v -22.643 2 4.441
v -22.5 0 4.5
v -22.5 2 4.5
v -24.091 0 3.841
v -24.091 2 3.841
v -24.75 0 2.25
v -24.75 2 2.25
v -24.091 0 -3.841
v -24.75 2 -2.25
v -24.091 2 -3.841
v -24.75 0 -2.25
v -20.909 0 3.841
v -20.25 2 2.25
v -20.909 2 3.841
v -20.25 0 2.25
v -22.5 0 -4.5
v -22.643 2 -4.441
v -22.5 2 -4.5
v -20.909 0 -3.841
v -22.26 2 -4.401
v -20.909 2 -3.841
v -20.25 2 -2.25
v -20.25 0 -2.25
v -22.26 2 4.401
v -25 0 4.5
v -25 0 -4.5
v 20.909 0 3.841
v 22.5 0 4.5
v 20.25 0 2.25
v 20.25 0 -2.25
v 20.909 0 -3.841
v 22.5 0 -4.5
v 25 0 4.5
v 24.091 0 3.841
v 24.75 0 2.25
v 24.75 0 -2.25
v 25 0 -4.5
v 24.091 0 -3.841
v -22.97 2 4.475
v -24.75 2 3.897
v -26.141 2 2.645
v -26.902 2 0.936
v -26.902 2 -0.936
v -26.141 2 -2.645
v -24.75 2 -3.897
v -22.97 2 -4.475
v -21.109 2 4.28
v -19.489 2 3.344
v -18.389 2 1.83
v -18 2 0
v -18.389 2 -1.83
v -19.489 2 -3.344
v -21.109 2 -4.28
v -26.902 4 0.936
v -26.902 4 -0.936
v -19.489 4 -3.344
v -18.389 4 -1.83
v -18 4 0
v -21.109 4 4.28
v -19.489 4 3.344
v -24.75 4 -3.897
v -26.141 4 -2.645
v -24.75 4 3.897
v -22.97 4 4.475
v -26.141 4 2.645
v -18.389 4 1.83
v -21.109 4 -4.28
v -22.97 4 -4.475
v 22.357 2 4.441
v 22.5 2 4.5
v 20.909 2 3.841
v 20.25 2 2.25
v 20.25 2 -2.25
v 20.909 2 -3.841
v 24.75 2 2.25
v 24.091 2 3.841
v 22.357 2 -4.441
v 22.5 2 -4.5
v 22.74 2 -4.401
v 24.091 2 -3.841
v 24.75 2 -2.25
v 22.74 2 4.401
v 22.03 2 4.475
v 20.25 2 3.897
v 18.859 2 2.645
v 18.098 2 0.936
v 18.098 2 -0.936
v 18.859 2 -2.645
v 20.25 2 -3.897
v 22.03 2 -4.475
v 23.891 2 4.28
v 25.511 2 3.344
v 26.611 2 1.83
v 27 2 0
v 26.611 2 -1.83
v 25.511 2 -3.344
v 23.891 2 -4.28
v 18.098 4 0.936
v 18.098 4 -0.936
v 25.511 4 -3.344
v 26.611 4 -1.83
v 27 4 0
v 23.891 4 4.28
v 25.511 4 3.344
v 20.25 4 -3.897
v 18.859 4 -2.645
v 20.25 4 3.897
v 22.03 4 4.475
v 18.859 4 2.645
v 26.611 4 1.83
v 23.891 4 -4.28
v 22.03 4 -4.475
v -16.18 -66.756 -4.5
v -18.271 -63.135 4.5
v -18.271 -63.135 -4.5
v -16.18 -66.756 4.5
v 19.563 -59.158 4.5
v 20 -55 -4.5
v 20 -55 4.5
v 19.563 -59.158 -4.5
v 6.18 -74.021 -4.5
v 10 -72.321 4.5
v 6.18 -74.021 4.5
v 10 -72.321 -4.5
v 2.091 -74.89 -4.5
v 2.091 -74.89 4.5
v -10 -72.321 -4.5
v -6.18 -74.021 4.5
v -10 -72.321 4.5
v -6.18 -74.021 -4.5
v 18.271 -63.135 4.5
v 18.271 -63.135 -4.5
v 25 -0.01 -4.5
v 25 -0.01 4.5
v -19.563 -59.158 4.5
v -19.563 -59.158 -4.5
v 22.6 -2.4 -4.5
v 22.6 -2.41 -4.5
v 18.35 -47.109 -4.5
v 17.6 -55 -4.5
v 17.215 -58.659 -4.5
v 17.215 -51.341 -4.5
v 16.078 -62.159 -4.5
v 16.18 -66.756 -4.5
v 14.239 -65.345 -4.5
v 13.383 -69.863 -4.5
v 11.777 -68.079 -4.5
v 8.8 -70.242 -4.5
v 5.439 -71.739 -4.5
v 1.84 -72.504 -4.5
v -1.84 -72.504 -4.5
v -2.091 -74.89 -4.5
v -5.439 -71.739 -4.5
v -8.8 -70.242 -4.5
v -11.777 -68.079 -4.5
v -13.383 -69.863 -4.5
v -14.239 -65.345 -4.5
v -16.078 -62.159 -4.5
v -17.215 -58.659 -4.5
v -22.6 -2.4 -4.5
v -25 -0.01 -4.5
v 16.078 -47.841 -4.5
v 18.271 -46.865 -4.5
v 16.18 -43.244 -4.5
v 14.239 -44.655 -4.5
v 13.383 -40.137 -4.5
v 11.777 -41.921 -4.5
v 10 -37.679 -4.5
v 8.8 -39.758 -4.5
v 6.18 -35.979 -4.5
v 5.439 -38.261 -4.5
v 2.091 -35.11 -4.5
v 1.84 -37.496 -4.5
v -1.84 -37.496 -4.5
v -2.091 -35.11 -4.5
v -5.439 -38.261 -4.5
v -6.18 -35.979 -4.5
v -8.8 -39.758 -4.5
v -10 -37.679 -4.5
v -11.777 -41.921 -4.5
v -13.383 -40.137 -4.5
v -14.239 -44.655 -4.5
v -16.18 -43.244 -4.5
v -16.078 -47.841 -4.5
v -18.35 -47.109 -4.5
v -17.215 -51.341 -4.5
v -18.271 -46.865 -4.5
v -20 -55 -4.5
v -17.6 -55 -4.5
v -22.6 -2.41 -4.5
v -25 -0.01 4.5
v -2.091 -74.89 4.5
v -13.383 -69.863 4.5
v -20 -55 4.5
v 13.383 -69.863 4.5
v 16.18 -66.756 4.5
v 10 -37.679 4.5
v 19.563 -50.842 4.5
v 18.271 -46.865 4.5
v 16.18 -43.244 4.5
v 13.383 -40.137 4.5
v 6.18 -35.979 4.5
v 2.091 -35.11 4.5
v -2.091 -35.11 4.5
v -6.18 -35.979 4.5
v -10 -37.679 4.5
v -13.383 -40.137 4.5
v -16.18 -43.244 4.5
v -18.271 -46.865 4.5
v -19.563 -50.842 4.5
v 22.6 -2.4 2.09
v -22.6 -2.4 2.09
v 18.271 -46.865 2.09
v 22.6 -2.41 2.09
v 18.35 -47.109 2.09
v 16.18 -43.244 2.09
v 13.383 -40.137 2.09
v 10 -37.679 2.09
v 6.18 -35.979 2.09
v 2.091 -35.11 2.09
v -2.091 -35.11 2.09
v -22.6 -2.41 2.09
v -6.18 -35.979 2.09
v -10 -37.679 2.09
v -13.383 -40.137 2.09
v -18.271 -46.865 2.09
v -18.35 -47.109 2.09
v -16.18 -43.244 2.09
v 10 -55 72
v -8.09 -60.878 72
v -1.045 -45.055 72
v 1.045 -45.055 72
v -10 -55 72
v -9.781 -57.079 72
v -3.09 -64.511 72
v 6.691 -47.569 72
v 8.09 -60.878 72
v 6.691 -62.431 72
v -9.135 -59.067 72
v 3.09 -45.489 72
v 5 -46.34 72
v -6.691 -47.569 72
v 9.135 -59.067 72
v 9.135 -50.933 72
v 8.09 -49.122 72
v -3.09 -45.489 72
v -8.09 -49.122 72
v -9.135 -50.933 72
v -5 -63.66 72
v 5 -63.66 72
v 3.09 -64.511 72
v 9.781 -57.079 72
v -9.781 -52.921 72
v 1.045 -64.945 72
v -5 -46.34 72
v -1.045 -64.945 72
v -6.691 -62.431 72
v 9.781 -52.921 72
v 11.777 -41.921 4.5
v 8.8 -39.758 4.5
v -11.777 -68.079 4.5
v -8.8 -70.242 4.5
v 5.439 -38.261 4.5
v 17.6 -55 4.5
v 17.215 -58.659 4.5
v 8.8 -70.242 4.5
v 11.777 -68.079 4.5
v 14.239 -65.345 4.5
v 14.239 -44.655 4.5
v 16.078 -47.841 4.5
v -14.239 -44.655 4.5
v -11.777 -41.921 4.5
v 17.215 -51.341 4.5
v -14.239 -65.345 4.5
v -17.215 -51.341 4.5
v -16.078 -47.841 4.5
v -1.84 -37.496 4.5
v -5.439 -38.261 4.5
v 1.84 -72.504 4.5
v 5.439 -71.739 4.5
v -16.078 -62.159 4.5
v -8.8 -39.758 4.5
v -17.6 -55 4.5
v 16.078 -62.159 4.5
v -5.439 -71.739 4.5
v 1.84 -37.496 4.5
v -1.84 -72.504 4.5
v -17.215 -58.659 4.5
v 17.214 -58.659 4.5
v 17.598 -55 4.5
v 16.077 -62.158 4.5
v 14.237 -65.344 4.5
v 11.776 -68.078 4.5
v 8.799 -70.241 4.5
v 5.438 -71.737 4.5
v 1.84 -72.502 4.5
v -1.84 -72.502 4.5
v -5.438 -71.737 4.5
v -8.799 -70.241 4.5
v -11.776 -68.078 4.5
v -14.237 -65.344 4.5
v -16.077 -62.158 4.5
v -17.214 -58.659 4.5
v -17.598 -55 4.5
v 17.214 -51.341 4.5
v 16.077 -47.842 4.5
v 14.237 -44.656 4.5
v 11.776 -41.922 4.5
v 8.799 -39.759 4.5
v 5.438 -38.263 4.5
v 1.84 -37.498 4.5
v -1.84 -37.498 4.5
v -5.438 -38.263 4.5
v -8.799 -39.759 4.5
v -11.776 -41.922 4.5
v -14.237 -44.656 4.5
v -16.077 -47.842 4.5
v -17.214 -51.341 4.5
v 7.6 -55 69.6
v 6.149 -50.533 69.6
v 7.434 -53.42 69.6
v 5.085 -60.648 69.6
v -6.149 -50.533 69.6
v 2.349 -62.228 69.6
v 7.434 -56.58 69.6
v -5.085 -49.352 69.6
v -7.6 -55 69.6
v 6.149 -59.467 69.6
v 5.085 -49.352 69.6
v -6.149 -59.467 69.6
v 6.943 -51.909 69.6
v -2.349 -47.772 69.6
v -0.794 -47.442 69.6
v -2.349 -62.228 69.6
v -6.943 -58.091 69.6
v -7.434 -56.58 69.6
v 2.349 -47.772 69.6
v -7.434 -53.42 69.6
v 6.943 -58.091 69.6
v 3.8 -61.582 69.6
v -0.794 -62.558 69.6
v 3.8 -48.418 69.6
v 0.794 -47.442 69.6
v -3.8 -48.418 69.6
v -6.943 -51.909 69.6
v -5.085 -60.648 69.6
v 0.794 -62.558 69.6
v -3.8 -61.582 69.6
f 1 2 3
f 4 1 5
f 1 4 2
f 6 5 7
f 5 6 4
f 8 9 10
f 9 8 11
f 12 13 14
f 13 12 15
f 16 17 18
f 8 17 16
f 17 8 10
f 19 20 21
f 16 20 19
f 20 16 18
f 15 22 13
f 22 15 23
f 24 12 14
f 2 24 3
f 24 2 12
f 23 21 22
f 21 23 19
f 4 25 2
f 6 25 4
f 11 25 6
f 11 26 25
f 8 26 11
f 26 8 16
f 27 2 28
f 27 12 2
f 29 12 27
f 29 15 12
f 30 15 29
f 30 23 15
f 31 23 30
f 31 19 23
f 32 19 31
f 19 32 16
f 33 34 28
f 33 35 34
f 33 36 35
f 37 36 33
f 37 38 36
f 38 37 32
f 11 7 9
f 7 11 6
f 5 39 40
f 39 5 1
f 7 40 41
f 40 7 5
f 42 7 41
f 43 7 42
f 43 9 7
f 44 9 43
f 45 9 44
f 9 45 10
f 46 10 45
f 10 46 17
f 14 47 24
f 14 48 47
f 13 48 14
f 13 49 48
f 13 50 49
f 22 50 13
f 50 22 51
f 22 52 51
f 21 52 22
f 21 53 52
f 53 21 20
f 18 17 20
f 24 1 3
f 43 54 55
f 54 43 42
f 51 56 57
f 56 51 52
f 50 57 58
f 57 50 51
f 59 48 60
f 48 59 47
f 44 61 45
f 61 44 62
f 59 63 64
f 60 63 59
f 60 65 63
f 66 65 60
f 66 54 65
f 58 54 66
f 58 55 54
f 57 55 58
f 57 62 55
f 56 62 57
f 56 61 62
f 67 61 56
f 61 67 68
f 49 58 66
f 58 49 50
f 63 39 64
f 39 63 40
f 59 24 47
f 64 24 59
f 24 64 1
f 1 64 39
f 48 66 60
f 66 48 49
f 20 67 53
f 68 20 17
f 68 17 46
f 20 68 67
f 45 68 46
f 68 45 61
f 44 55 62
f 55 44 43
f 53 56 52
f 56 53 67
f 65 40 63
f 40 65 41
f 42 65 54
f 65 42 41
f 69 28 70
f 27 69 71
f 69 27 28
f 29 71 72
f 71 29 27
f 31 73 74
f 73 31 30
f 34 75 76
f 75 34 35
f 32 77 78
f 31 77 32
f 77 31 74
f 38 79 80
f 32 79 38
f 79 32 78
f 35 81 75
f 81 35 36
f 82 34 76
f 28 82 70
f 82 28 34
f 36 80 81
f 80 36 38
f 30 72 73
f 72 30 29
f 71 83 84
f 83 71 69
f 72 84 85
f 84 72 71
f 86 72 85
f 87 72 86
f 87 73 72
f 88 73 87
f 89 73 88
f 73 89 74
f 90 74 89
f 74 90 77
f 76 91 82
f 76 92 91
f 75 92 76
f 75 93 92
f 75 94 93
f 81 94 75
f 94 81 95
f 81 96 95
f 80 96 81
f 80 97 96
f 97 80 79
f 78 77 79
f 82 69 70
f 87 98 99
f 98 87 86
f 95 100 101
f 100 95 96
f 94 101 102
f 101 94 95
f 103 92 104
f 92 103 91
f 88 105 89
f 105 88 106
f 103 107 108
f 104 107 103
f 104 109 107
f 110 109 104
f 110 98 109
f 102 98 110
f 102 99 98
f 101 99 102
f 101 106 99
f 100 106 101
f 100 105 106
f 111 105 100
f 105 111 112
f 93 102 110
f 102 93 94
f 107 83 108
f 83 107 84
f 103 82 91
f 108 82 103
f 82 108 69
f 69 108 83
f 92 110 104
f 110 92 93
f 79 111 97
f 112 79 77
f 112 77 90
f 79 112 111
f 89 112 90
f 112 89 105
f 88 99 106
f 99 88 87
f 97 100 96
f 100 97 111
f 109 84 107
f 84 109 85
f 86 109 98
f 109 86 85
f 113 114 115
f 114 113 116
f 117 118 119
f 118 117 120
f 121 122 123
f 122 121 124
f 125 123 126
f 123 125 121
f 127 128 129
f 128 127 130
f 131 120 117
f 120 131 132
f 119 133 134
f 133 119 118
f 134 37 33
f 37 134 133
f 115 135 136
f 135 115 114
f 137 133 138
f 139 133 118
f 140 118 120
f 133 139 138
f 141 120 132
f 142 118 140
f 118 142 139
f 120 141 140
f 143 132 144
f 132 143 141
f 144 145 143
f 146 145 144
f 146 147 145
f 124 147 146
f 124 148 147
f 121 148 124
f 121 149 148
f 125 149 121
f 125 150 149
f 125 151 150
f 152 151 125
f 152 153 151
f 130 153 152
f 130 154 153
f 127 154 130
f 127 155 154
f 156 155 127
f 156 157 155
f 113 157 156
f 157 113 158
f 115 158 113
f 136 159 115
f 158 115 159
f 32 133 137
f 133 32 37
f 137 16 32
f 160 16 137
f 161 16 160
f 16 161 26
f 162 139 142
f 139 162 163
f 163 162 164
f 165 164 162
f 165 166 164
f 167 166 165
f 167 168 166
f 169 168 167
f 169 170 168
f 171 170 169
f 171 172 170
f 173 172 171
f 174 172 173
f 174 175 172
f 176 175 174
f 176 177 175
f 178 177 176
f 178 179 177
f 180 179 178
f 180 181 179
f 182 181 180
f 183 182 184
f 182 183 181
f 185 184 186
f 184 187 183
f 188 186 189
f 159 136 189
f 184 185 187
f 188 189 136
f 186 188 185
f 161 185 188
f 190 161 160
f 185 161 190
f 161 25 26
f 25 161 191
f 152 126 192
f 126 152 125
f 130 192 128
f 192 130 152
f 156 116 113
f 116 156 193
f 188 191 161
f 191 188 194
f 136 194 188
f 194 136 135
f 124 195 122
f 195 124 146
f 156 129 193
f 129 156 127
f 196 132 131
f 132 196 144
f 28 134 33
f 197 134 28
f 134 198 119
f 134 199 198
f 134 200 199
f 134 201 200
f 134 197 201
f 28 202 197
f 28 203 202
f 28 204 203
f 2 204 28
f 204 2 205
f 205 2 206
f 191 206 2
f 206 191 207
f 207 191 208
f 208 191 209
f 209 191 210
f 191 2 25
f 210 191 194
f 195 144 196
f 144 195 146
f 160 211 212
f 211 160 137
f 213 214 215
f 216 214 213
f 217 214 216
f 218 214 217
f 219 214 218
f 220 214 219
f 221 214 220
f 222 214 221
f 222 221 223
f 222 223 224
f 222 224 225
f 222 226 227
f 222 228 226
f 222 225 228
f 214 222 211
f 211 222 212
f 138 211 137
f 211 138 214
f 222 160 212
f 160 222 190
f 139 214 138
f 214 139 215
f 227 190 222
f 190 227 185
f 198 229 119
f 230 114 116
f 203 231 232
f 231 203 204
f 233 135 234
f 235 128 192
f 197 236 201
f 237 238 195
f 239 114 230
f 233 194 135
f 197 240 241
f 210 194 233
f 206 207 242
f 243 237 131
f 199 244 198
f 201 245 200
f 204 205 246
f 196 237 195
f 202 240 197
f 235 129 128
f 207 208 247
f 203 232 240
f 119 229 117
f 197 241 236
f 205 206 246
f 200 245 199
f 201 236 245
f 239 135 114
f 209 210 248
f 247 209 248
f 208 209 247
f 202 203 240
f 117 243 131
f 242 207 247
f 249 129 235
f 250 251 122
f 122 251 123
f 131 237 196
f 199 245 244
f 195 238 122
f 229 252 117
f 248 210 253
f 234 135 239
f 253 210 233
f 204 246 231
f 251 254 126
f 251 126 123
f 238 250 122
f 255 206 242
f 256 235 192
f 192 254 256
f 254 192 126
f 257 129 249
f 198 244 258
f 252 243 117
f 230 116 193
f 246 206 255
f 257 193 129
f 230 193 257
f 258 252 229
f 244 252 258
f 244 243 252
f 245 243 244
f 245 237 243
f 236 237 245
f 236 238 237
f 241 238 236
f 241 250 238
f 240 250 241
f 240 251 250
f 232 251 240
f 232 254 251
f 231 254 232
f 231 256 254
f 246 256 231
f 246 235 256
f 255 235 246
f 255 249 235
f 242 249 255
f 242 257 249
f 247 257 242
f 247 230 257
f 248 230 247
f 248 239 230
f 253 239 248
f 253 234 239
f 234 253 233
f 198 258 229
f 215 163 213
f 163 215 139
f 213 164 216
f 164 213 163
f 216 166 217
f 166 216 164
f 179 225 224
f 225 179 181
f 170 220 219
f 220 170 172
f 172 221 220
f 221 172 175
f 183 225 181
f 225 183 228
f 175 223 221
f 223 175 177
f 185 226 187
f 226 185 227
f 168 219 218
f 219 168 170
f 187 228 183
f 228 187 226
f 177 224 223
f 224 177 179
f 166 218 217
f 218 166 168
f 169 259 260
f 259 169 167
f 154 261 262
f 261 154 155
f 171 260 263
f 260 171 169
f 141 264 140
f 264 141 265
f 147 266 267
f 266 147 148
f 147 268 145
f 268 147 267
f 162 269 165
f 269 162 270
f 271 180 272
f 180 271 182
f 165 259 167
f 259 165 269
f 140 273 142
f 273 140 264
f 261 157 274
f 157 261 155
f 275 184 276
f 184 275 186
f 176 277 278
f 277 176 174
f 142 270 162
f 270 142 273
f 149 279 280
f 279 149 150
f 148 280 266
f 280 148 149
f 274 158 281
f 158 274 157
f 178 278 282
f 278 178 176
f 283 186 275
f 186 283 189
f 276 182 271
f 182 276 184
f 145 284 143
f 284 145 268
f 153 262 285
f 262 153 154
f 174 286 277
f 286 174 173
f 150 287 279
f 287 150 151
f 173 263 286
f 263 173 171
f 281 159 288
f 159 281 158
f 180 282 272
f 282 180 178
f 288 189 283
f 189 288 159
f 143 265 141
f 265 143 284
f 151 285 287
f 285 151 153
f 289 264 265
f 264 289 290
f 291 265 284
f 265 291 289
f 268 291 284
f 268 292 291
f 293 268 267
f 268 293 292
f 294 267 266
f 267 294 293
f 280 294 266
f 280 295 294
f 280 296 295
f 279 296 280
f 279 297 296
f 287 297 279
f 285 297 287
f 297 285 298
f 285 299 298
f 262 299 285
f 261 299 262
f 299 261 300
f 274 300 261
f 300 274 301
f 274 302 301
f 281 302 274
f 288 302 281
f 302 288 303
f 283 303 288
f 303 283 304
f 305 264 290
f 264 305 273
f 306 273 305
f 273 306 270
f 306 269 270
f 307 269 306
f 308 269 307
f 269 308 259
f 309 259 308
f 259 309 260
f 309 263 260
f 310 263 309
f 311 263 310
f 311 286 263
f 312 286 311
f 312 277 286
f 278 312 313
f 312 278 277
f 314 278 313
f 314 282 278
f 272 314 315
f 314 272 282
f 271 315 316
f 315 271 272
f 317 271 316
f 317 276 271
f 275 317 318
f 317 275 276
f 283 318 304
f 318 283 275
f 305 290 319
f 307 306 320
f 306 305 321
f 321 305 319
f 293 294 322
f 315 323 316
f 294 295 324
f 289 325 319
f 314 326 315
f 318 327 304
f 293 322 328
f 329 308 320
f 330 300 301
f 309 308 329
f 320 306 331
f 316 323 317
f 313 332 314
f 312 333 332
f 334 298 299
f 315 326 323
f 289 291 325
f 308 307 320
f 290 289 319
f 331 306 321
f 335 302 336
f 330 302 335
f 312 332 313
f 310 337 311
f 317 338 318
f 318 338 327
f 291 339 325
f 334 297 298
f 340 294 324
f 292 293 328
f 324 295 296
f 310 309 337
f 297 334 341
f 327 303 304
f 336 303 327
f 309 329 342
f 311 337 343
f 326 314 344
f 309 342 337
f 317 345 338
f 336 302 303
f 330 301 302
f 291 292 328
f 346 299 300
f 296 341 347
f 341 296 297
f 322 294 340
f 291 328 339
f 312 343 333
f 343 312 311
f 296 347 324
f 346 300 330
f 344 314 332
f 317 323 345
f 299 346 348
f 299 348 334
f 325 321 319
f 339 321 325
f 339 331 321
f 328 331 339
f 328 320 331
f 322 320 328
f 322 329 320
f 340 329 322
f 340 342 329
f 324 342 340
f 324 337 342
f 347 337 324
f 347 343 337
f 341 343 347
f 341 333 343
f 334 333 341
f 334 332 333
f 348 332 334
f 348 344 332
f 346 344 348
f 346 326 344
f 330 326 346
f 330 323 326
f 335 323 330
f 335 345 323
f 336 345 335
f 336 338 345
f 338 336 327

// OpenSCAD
// file: peg.scad
pegSlot = 5; // the small opening it slides into
pegD = 9;    // the large opening to put it into
pegH = 22;   // top of large opening to bottom of small opening

holeD = 3.75; // "screw" holes

holeSpacingX = 15;
holeSpacingY = 14.5; // yes, this is actually not a grid. go figure
pegSpacingX = 3 * holeSpacingX;
pegSpacingY = 4 * holeSpacingY;

module peg(t = 2, clearance = 2)
{
    D = pegD;
    d = 4.5;

    rotate([ -90, 0, 0 ])
    {
        hull()
        {
            translate([ 0, (D - d) / 2, 0 ]) cylinder(h = clearance, d = d);
            translate([ 0, -(D - d) / 2, 0 ]) cylinder(h = clearance, d = d);
        }
        translate([ 0, 0, clearance ]) cylinder(h = t, d = D);
    }
}

module pegs(n, t = 2, clearance = 2)
{
    pegSpacingX = 45;
    x0 = ((1 - n) * pegSpacingX) / 2;
    for (i = [0:(n - 1)])
    {
        translate([ x0 + i * pegSpacingX, 0, 0 ]) peg(t, clearance);
    }
}
// main file
include<peg.scad>;

dOut = 110;
dIn1 = 40;
dIn2 = 20; // slightly less than 1.5"?

height = 1.5 * pegSpacingX;
thickness = 2.4;
taper = 3 / 4 * dIn2;

width = pegSpacingX + pegSlot;

towelHolder();
module towelHolder(t = thickness)
{
    module base(l, w, h, r)
    {
        hull()
        {
            translate([ -l / 2, -0.01, 0 ]) cube([ l, 0.01, h ]);
            translate([ 0, r - w, 0 ]) cylinder(h = h, r = r);
        }
    }
    pegs(2);
    difference()
    {
        union()
        {
            difference()
            {
                translate([ 0, 0, -pegD / 2 ]) base(width, dOut / 2 + dIn1 / 2, pegD, dIn1 / 2);
                translate([ 0, -t, -pegD / 2 - .01 ])
                    base(width - 2 * t, dOut / 2 + dIn1 / 2 - 2 * t, pegD - t, dIn1 / 2 - t);
            }
            translate([ 0, -dOut / 2, pegD / 2 ]) cylinder(h = height, d1 = dIn1, d2 = dIn2);
            translate([ 0, -dOut / 2, -pegD / 2 ]) cylinder(h = pegD, d = dIn1);
        }
        translate([ 0, -dOut / 2, -pegD / 2 - .01 ]) cylinder(h = pegD + .01, r = dIn1 / 2 - t);
        translate([ 0, -dOut / 2, pegD / 2 - .01 ])
            cylinder(h = height - t + .01, r1 = dIn1 / 2 - t, d2 = dIn2 - 2 * t);
    }
}
